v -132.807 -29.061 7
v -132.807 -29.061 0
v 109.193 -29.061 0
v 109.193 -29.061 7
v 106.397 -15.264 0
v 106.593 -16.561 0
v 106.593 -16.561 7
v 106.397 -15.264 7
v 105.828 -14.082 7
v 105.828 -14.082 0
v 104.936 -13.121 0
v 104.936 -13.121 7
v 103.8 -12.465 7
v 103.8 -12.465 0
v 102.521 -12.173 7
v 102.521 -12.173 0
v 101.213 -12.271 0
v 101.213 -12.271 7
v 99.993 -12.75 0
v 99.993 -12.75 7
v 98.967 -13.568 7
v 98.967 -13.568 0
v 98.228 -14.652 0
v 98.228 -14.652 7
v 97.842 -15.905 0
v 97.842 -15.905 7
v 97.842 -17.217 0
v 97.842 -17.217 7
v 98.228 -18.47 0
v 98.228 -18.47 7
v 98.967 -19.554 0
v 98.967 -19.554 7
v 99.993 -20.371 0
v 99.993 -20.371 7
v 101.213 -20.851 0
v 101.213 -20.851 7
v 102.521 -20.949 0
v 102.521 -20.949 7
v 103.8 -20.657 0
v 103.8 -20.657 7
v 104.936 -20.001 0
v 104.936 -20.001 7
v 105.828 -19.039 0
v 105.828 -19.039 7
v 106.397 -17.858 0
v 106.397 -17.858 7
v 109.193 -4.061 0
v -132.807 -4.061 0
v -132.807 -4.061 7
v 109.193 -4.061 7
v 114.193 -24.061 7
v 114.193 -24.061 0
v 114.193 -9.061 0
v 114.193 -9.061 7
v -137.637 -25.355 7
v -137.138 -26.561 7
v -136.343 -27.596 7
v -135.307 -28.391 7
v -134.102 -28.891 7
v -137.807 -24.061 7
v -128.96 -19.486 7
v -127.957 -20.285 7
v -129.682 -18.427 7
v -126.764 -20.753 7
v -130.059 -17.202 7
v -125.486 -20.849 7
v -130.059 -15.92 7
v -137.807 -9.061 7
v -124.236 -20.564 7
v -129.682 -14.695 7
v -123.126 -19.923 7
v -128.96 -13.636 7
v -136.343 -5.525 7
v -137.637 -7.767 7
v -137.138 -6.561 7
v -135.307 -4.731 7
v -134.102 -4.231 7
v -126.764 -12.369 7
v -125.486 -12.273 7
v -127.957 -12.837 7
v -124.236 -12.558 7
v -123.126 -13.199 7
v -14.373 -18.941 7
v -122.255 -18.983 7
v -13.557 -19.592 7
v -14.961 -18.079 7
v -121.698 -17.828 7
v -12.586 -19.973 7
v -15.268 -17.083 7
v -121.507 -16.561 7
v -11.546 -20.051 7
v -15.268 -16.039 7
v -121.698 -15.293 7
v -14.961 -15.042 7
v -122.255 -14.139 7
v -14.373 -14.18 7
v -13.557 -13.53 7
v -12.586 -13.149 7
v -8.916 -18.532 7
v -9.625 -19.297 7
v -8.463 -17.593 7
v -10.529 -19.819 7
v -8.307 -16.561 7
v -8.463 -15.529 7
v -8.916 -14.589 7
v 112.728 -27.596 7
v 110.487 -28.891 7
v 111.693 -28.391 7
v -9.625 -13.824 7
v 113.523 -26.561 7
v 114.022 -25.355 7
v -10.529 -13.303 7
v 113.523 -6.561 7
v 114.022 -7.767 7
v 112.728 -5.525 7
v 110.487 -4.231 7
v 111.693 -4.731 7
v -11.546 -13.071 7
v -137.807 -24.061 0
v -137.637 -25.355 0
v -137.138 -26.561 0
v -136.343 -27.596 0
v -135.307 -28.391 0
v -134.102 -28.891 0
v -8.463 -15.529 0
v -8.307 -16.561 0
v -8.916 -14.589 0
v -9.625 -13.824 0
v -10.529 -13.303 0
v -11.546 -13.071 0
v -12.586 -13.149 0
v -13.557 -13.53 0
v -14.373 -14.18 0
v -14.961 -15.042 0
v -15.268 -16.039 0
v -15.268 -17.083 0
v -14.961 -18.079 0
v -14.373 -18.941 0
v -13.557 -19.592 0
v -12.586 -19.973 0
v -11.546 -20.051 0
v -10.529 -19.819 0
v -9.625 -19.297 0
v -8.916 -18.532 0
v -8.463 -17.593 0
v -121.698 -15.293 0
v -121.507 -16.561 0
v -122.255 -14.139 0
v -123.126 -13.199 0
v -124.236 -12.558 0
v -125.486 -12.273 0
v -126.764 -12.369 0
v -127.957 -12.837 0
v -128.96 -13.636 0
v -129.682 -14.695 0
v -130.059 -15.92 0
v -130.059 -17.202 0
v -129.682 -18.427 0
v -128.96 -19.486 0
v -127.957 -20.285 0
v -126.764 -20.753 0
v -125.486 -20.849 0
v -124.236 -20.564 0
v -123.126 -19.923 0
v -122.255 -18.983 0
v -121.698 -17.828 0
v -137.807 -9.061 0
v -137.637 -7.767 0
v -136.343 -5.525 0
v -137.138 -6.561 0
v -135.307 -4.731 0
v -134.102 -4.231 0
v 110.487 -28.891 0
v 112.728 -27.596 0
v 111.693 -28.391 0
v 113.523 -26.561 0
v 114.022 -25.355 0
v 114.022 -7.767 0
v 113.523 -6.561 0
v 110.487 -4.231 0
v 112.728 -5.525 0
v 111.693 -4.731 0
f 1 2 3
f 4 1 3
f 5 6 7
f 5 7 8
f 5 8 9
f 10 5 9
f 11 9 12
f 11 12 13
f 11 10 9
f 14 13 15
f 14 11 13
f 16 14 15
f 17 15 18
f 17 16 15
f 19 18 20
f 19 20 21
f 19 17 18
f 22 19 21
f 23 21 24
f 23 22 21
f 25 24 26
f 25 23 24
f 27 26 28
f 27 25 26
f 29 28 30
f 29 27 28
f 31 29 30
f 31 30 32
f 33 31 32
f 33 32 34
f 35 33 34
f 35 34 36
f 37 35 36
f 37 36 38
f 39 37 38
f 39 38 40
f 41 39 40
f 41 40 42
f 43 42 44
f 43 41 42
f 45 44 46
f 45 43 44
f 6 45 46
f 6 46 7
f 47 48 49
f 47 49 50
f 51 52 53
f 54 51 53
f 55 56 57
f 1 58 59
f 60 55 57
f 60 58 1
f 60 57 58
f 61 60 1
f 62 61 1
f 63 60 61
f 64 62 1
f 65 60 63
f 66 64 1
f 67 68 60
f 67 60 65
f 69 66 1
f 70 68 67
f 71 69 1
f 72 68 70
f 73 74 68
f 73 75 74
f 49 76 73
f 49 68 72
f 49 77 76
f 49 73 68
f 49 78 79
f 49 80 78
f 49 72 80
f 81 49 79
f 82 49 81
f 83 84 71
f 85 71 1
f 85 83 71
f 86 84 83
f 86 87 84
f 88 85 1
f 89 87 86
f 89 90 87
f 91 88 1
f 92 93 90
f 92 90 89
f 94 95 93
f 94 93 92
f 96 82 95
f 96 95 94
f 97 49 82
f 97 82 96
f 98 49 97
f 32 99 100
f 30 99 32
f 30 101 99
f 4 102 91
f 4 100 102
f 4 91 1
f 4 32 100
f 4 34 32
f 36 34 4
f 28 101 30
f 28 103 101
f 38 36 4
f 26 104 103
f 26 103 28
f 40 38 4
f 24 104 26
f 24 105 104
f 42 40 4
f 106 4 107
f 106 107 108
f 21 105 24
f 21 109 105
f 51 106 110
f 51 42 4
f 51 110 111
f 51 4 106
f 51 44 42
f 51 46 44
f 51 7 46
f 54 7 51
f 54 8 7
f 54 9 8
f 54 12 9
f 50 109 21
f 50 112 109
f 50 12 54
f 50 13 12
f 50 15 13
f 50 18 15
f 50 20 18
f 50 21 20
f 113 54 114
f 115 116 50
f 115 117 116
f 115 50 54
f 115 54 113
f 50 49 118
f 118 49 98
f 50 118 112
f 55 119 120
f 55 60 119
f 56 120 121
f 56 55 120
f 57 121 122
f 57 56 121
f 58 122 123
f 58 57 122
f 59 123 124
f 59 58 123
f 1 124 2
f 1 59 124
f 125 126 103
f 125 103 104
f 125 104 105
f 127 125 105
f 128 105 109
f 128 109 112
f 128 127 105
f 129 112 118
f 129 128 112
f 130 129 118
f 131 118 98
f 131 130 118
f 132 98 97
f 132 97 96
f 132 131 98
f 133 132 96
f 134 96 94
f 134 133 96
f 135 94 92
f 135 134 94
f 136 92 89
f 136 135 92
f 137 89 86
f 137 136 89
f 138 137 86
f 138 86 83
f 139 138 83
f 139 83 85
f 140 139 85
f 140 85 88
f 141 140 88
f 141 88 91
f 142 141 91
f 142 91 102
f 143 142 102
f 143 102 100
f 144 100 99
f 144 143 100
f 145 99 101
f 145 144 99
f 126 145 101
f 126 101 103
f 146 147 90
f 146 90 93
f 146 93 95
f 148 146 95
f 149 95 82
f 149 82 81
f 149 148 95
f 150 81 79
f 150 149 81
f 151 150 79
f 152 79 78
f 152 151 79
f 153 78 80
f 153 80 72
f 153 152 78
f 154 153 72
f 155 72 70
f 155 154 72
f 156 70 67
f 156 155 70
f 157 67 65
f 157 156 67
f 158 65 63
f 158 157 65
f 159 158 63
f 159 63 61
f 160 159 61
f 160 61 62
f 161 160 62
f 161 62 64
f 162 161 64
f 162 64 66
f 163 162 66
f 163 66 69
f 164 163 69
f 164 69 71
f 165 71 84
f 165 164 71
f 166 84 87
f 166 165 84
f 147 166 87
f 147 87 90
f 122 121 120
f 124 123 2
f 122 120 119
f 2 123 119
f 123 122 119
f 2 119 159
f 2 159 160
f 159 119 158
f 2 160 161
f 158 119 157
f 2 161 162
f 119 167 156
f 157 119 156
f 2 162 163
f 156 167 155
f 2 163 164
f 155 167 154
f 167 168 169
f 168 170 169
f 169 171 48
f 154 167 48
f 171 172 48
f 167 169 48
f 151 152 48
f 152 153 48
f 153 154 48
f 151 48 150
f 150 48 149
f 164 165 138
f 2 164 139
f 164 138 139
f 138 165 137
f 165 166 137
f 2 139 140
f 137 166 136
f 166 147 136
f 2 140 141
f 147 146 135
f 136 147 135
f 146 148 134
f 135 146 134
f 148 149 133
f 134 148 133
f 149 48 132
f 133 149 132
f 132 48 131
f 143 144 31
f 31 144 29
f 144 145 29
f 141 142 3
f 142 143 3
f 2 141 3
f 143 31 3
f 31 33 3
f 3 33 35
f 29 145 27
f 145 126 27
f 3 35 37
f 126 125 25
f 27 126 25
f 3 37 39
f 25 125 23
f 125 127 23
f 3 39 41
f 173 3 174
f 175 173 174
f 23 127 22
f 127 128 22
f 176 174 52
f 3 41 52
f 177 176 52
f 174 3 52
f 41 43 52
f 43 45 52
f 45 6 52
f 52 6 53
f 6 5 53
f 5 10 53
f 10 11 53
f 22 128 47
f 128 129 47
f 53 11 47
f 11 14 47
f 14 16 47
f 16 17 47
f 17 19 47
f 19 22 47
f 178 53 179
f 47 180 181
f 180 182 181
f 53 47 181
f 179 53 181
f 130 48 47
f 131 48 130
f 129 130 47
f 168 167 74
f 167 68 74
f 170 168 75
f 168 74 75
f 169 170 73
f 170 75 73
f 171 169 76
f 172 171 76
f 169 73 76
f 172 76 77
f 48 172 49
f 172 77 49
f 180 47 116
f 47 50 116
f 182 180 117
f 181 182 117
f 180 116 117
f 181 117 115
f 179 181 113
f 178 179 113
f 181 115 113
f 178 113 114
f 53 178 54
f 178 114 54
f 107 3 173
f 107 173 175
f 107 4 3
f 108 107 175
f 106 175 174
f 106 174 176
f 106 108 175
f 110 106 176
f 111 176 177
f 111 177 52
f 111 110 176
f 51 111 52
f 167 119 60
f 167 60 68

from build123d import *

# Parameters (mm, degrees)
F0_W     = 252
F0_H     = 25
F0_R     = 4.3
F0_R_2   = 3.5
F0_R_3   = 4.4
F1_DEPTH = 7
F2_R     = 5


with BuildPart() as f1:
    # F0 (on Top) → F1 (new body)
    with BuildSketch(Plane.XY):
        with Locations((-11.807408, -16.560878)):
            Rectangle(F0_W, F0_H)
        with Locations((-125.807408, -16.560878)):
            Circle(F0_R, mode=Mode.SUBTRACT)
        with Locations((-11.807408, -16.560878)):
            Circle(F0_R_2, mode=Mode.SUBTRACT)
        with Locations((102.192592, -16.560878)):
            Circle(F0_R_3, mode=Mode.SUBTRACT)
    extrude(amount=F1_DEPTH)

    # F2
    f2_edges = [f1.edges().sort_by_distance(p)[0] for p in [
        (114.192592, -29.060878, 3.5),
        (114.192592, -4.060878, 3.5),
        (-137.807408, -29.060878, 3.5),
        (-137.807408, -4.060878, 3.5),
    ]]
    fillet(f2_edges, radius=F2_R)


solid = f1.part
